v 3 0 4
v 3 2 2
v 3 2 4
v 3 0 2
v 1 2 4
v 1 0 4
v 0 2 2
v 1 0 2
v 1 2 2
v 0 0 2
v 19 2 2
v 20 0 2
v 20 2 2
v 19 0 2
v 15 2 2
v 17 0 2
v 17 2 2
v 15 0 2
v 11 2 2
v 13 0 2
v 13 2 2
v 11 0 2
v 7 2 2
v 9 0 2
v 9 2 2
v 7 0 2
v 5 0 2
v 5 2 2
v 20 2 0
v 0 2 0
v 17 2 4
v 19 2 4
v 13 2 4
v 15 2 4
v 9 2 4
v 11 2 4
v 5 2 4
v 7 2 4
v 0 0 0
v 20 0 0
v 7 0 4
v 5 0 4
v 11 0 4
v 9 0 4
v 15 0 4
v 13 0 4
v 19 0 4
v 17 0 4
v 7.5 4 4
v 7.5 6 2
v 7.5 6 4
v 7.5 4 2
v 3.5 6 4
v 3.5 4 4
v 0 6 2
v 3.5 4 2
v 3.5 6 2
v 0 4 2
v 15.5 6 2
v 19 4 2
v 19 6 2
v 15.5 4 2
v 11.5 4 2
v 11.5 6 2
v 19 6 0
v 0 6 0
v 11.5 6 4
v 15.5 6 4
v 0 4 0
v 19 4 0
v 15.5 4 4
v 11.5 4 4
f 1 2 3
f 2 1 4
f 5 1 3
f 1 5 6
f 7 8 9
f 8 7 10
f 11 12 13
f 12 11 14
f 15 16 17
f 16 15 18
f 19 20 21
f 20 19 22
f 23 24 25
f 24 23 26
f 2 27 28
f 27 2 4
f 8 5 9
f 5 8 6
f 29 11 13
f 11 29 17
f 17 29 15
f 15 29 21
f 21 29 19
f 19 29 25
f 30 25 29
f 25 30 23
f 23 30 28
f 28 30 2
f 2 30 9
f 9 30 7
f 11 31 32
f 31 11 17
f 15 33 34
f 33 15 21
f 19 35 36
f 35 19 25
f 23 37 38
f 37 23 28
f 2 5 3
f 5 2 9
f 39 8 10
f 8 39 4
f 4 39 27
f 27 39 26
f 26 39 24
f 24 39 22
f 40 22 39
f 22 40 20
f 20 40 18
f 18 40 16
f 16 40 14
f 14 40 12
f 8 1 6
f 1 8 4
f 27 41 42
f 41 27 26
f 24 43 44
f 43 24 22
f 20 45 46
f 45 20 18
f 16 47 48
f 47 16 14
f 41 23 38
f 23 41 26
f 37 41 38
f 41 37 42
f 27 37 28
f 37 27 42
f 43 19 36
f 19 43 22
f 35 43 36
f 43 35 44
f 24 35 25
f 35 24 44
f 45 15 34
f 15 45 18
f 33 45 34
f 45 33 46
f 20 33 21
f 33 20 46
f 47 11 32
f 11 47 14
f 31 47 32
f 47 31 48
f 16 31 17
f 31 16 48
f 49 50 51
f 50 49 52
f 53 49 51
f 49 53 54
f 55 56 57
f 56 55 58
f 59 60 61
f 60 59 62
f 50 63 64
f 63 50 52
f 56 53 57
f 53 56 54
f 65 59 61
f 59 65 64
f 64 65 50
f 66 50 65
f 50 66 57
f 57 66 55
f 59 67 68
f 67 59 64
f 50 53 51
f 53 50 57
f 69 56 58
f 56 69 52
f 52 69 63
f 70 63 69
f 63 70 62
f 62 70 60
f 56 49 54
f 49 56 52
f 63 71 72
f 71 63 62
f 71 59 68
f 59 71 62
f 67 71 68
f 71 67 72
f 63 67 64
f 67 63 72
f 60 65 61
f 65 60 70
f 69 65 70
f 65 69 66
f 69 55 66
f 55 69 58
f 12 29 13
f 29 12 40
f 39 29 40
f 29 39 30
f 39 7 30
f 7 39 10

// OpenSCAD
// file: utility.scad
/*This library is placed into the public domain by NMR_Scientist.

Version: R1
Title: Utility
Description: Miscellaneous utility modules I developed over the course of several projects to reuse common operations that were seen over various models.

History:
* ??/??/2024 - R1 - First release to be with a model whenever it is released. 
*/

$fa = 1;
$fs = 0.1;

use <MCAD/regular_shapes.scad>;

//Move objects in the x-axis.
module move_x (x)
{
    translate([x,0,0])
    {
        children();
    }
}

//Move objects in the y-axis
module move_y (y)
{
    translate([0,y,0])
    {
        children();
    }
}

//Move objects in the z-ax
module move_z (z)
{
    translate([0,0,z])
    {
        children();
    }
}

//Move objects by a given point in all direction. -1 would means moving to the left, moving back, and moving down by one point. 
module move_by(point)
{
    translate([point,point,point])
    {
        children();
    }
}

//Exactly like move_by, but a negation. Named for its very common use in adding tolerance to objects.
module move_by_margin(m)
{
    move_by(-m)
    {
        children();
    }
}

//A cylinder rotated to its side.
module hor_cylinder(width,r,r)
{
    move_y(r)
        move_z(r)
            rotate([0,90,0])
            {
                cylinder(width,r,r);
            }
}

module hor_cylinder_y(length,r)
{
    translate([r * 2,0,0])
    {
        rotate([0,0,90])
        {
            hor_cylinder(length,r);
        }
    }
}


//Cut a object at a given height and then move that object down, usually to zero if the object was placed at zero height.
module hor_cut(width,length,height)
{
    translate([0,0,-height])
    {
        difference()
        {
            children();
            translate([-1,-1,-1])
            {
                cube([width + 2,length + 2,height + 1]);
            }
        }
    }
}

function bevel_radius(length) = length * 2 / 3;
function bevel_height(r) = r * sqrt(3)/2;

//Bevel at 45 degree slop up, facing, back, then extrude upward by height.
module bevel_up_back_45(width,length,height)
{
    r = bevel_radius(length);
    z = bevel_height(r);
    m = 0.1;
    m_2 = m * 2;
    difference()
    {
        translate([0,r / 2,z])
        {
            rotate([0,90,0])
            {
                triangle_prism(width,r);
            }   
        }
        // Cut off to the required height.
        move_x(-m)
            move_y(-m)
                move_z(height)
                   cube([width + m,length + m,z * 2 - height]);
    }
    //If cutting off isn't happening simply add height.
    if (height >= z)
    {
        move_z(z)
        {
            cube([width,length,height - z]);
        }
    }
}

//Center an object against a particular width of another object.
module center(centering_w,target_w)
{
    x = (target_w - centering_w) / 2;
    translate([x,0,0])
    {
        children();
    }
}

//Move object to a certain value of x, but also account for the object size, such that the object is place before the point x. For a postive value of x, that is before the x, for a negative value of x, that is next to x. Useful for dimensional accurate placement. 
module move_object_x(x,r)
{
    diameter = r * 2;
    if (abs(x) < diameter)
    {
        echo("Cannot move!");
    }
    else
    {
        if (x > 0)
        {
            move_x(x - diameter)
            {
                children();
            }
        }
        else if (x < 0)
        {
            move_x(x + diameter)
                children();
        }
    }
}


//Move object to a certain value of z, but also account for the object size, such that the object is place before the point z. For a postive value of z, that is below of z, for a negative value of z, that is above z. Useful for dimensional accurate placement. 
module move_object_z(z, r)
{
    diameter = r * 2;
    if (abs(z) < diameter)
    {
        echo("Cannot move!");
    }
    else
    {
        if (z > 0)
        {
            move_z(z - diameter)
            {
                children();
            }
        }
        else if (z < 0)
        {
            move_z(z + diameter)
                children();
        }
    }
}


//Generaate all notches in a castellation at the same time, and space each notch for the length of the notch.
module notches(n, multipler)
{
    for (x = [1:n])
    {   
        final_x = (x - 1) * multipler;
        move_x(final_x)
        {
            if ((x - 1) % 2 == 0)
            {
               children();
            }
        }
    }
}

//Get the total width of the Castellation, starting with the first and last notches.
function CastellateTotalW(w,size) = (w - 1) % 2 == 1 ? (w - 1) * size.x : w * size.x;


//Center the resulting castellation of a certain cuboid size. 
module castellate(width,size, m = 0)
{
    total_notches = floor(width / size.x);
    total_w = CastellateTotalW(total_notches,size);
    center(total_w,width)
    {
        notches(total_notches,size.x)
        {
            move_x(m)
            {
                shrink = [size.x - (m * 2),size.y,size.z];
                cube(shrink);
            }
        }
    }

}
// main file
use <utility.scad>;

cube2 = [2,2,2];
d = 20;
cube([d,2,2]);
move_z(2)
    castellate(d,cube2);
    
move_y(4)
{
    cube3 = [4,2,2];
    d = 19;
    cube([d,2,2]);
    move_z(2)
    castellate(d,cube3);
}
